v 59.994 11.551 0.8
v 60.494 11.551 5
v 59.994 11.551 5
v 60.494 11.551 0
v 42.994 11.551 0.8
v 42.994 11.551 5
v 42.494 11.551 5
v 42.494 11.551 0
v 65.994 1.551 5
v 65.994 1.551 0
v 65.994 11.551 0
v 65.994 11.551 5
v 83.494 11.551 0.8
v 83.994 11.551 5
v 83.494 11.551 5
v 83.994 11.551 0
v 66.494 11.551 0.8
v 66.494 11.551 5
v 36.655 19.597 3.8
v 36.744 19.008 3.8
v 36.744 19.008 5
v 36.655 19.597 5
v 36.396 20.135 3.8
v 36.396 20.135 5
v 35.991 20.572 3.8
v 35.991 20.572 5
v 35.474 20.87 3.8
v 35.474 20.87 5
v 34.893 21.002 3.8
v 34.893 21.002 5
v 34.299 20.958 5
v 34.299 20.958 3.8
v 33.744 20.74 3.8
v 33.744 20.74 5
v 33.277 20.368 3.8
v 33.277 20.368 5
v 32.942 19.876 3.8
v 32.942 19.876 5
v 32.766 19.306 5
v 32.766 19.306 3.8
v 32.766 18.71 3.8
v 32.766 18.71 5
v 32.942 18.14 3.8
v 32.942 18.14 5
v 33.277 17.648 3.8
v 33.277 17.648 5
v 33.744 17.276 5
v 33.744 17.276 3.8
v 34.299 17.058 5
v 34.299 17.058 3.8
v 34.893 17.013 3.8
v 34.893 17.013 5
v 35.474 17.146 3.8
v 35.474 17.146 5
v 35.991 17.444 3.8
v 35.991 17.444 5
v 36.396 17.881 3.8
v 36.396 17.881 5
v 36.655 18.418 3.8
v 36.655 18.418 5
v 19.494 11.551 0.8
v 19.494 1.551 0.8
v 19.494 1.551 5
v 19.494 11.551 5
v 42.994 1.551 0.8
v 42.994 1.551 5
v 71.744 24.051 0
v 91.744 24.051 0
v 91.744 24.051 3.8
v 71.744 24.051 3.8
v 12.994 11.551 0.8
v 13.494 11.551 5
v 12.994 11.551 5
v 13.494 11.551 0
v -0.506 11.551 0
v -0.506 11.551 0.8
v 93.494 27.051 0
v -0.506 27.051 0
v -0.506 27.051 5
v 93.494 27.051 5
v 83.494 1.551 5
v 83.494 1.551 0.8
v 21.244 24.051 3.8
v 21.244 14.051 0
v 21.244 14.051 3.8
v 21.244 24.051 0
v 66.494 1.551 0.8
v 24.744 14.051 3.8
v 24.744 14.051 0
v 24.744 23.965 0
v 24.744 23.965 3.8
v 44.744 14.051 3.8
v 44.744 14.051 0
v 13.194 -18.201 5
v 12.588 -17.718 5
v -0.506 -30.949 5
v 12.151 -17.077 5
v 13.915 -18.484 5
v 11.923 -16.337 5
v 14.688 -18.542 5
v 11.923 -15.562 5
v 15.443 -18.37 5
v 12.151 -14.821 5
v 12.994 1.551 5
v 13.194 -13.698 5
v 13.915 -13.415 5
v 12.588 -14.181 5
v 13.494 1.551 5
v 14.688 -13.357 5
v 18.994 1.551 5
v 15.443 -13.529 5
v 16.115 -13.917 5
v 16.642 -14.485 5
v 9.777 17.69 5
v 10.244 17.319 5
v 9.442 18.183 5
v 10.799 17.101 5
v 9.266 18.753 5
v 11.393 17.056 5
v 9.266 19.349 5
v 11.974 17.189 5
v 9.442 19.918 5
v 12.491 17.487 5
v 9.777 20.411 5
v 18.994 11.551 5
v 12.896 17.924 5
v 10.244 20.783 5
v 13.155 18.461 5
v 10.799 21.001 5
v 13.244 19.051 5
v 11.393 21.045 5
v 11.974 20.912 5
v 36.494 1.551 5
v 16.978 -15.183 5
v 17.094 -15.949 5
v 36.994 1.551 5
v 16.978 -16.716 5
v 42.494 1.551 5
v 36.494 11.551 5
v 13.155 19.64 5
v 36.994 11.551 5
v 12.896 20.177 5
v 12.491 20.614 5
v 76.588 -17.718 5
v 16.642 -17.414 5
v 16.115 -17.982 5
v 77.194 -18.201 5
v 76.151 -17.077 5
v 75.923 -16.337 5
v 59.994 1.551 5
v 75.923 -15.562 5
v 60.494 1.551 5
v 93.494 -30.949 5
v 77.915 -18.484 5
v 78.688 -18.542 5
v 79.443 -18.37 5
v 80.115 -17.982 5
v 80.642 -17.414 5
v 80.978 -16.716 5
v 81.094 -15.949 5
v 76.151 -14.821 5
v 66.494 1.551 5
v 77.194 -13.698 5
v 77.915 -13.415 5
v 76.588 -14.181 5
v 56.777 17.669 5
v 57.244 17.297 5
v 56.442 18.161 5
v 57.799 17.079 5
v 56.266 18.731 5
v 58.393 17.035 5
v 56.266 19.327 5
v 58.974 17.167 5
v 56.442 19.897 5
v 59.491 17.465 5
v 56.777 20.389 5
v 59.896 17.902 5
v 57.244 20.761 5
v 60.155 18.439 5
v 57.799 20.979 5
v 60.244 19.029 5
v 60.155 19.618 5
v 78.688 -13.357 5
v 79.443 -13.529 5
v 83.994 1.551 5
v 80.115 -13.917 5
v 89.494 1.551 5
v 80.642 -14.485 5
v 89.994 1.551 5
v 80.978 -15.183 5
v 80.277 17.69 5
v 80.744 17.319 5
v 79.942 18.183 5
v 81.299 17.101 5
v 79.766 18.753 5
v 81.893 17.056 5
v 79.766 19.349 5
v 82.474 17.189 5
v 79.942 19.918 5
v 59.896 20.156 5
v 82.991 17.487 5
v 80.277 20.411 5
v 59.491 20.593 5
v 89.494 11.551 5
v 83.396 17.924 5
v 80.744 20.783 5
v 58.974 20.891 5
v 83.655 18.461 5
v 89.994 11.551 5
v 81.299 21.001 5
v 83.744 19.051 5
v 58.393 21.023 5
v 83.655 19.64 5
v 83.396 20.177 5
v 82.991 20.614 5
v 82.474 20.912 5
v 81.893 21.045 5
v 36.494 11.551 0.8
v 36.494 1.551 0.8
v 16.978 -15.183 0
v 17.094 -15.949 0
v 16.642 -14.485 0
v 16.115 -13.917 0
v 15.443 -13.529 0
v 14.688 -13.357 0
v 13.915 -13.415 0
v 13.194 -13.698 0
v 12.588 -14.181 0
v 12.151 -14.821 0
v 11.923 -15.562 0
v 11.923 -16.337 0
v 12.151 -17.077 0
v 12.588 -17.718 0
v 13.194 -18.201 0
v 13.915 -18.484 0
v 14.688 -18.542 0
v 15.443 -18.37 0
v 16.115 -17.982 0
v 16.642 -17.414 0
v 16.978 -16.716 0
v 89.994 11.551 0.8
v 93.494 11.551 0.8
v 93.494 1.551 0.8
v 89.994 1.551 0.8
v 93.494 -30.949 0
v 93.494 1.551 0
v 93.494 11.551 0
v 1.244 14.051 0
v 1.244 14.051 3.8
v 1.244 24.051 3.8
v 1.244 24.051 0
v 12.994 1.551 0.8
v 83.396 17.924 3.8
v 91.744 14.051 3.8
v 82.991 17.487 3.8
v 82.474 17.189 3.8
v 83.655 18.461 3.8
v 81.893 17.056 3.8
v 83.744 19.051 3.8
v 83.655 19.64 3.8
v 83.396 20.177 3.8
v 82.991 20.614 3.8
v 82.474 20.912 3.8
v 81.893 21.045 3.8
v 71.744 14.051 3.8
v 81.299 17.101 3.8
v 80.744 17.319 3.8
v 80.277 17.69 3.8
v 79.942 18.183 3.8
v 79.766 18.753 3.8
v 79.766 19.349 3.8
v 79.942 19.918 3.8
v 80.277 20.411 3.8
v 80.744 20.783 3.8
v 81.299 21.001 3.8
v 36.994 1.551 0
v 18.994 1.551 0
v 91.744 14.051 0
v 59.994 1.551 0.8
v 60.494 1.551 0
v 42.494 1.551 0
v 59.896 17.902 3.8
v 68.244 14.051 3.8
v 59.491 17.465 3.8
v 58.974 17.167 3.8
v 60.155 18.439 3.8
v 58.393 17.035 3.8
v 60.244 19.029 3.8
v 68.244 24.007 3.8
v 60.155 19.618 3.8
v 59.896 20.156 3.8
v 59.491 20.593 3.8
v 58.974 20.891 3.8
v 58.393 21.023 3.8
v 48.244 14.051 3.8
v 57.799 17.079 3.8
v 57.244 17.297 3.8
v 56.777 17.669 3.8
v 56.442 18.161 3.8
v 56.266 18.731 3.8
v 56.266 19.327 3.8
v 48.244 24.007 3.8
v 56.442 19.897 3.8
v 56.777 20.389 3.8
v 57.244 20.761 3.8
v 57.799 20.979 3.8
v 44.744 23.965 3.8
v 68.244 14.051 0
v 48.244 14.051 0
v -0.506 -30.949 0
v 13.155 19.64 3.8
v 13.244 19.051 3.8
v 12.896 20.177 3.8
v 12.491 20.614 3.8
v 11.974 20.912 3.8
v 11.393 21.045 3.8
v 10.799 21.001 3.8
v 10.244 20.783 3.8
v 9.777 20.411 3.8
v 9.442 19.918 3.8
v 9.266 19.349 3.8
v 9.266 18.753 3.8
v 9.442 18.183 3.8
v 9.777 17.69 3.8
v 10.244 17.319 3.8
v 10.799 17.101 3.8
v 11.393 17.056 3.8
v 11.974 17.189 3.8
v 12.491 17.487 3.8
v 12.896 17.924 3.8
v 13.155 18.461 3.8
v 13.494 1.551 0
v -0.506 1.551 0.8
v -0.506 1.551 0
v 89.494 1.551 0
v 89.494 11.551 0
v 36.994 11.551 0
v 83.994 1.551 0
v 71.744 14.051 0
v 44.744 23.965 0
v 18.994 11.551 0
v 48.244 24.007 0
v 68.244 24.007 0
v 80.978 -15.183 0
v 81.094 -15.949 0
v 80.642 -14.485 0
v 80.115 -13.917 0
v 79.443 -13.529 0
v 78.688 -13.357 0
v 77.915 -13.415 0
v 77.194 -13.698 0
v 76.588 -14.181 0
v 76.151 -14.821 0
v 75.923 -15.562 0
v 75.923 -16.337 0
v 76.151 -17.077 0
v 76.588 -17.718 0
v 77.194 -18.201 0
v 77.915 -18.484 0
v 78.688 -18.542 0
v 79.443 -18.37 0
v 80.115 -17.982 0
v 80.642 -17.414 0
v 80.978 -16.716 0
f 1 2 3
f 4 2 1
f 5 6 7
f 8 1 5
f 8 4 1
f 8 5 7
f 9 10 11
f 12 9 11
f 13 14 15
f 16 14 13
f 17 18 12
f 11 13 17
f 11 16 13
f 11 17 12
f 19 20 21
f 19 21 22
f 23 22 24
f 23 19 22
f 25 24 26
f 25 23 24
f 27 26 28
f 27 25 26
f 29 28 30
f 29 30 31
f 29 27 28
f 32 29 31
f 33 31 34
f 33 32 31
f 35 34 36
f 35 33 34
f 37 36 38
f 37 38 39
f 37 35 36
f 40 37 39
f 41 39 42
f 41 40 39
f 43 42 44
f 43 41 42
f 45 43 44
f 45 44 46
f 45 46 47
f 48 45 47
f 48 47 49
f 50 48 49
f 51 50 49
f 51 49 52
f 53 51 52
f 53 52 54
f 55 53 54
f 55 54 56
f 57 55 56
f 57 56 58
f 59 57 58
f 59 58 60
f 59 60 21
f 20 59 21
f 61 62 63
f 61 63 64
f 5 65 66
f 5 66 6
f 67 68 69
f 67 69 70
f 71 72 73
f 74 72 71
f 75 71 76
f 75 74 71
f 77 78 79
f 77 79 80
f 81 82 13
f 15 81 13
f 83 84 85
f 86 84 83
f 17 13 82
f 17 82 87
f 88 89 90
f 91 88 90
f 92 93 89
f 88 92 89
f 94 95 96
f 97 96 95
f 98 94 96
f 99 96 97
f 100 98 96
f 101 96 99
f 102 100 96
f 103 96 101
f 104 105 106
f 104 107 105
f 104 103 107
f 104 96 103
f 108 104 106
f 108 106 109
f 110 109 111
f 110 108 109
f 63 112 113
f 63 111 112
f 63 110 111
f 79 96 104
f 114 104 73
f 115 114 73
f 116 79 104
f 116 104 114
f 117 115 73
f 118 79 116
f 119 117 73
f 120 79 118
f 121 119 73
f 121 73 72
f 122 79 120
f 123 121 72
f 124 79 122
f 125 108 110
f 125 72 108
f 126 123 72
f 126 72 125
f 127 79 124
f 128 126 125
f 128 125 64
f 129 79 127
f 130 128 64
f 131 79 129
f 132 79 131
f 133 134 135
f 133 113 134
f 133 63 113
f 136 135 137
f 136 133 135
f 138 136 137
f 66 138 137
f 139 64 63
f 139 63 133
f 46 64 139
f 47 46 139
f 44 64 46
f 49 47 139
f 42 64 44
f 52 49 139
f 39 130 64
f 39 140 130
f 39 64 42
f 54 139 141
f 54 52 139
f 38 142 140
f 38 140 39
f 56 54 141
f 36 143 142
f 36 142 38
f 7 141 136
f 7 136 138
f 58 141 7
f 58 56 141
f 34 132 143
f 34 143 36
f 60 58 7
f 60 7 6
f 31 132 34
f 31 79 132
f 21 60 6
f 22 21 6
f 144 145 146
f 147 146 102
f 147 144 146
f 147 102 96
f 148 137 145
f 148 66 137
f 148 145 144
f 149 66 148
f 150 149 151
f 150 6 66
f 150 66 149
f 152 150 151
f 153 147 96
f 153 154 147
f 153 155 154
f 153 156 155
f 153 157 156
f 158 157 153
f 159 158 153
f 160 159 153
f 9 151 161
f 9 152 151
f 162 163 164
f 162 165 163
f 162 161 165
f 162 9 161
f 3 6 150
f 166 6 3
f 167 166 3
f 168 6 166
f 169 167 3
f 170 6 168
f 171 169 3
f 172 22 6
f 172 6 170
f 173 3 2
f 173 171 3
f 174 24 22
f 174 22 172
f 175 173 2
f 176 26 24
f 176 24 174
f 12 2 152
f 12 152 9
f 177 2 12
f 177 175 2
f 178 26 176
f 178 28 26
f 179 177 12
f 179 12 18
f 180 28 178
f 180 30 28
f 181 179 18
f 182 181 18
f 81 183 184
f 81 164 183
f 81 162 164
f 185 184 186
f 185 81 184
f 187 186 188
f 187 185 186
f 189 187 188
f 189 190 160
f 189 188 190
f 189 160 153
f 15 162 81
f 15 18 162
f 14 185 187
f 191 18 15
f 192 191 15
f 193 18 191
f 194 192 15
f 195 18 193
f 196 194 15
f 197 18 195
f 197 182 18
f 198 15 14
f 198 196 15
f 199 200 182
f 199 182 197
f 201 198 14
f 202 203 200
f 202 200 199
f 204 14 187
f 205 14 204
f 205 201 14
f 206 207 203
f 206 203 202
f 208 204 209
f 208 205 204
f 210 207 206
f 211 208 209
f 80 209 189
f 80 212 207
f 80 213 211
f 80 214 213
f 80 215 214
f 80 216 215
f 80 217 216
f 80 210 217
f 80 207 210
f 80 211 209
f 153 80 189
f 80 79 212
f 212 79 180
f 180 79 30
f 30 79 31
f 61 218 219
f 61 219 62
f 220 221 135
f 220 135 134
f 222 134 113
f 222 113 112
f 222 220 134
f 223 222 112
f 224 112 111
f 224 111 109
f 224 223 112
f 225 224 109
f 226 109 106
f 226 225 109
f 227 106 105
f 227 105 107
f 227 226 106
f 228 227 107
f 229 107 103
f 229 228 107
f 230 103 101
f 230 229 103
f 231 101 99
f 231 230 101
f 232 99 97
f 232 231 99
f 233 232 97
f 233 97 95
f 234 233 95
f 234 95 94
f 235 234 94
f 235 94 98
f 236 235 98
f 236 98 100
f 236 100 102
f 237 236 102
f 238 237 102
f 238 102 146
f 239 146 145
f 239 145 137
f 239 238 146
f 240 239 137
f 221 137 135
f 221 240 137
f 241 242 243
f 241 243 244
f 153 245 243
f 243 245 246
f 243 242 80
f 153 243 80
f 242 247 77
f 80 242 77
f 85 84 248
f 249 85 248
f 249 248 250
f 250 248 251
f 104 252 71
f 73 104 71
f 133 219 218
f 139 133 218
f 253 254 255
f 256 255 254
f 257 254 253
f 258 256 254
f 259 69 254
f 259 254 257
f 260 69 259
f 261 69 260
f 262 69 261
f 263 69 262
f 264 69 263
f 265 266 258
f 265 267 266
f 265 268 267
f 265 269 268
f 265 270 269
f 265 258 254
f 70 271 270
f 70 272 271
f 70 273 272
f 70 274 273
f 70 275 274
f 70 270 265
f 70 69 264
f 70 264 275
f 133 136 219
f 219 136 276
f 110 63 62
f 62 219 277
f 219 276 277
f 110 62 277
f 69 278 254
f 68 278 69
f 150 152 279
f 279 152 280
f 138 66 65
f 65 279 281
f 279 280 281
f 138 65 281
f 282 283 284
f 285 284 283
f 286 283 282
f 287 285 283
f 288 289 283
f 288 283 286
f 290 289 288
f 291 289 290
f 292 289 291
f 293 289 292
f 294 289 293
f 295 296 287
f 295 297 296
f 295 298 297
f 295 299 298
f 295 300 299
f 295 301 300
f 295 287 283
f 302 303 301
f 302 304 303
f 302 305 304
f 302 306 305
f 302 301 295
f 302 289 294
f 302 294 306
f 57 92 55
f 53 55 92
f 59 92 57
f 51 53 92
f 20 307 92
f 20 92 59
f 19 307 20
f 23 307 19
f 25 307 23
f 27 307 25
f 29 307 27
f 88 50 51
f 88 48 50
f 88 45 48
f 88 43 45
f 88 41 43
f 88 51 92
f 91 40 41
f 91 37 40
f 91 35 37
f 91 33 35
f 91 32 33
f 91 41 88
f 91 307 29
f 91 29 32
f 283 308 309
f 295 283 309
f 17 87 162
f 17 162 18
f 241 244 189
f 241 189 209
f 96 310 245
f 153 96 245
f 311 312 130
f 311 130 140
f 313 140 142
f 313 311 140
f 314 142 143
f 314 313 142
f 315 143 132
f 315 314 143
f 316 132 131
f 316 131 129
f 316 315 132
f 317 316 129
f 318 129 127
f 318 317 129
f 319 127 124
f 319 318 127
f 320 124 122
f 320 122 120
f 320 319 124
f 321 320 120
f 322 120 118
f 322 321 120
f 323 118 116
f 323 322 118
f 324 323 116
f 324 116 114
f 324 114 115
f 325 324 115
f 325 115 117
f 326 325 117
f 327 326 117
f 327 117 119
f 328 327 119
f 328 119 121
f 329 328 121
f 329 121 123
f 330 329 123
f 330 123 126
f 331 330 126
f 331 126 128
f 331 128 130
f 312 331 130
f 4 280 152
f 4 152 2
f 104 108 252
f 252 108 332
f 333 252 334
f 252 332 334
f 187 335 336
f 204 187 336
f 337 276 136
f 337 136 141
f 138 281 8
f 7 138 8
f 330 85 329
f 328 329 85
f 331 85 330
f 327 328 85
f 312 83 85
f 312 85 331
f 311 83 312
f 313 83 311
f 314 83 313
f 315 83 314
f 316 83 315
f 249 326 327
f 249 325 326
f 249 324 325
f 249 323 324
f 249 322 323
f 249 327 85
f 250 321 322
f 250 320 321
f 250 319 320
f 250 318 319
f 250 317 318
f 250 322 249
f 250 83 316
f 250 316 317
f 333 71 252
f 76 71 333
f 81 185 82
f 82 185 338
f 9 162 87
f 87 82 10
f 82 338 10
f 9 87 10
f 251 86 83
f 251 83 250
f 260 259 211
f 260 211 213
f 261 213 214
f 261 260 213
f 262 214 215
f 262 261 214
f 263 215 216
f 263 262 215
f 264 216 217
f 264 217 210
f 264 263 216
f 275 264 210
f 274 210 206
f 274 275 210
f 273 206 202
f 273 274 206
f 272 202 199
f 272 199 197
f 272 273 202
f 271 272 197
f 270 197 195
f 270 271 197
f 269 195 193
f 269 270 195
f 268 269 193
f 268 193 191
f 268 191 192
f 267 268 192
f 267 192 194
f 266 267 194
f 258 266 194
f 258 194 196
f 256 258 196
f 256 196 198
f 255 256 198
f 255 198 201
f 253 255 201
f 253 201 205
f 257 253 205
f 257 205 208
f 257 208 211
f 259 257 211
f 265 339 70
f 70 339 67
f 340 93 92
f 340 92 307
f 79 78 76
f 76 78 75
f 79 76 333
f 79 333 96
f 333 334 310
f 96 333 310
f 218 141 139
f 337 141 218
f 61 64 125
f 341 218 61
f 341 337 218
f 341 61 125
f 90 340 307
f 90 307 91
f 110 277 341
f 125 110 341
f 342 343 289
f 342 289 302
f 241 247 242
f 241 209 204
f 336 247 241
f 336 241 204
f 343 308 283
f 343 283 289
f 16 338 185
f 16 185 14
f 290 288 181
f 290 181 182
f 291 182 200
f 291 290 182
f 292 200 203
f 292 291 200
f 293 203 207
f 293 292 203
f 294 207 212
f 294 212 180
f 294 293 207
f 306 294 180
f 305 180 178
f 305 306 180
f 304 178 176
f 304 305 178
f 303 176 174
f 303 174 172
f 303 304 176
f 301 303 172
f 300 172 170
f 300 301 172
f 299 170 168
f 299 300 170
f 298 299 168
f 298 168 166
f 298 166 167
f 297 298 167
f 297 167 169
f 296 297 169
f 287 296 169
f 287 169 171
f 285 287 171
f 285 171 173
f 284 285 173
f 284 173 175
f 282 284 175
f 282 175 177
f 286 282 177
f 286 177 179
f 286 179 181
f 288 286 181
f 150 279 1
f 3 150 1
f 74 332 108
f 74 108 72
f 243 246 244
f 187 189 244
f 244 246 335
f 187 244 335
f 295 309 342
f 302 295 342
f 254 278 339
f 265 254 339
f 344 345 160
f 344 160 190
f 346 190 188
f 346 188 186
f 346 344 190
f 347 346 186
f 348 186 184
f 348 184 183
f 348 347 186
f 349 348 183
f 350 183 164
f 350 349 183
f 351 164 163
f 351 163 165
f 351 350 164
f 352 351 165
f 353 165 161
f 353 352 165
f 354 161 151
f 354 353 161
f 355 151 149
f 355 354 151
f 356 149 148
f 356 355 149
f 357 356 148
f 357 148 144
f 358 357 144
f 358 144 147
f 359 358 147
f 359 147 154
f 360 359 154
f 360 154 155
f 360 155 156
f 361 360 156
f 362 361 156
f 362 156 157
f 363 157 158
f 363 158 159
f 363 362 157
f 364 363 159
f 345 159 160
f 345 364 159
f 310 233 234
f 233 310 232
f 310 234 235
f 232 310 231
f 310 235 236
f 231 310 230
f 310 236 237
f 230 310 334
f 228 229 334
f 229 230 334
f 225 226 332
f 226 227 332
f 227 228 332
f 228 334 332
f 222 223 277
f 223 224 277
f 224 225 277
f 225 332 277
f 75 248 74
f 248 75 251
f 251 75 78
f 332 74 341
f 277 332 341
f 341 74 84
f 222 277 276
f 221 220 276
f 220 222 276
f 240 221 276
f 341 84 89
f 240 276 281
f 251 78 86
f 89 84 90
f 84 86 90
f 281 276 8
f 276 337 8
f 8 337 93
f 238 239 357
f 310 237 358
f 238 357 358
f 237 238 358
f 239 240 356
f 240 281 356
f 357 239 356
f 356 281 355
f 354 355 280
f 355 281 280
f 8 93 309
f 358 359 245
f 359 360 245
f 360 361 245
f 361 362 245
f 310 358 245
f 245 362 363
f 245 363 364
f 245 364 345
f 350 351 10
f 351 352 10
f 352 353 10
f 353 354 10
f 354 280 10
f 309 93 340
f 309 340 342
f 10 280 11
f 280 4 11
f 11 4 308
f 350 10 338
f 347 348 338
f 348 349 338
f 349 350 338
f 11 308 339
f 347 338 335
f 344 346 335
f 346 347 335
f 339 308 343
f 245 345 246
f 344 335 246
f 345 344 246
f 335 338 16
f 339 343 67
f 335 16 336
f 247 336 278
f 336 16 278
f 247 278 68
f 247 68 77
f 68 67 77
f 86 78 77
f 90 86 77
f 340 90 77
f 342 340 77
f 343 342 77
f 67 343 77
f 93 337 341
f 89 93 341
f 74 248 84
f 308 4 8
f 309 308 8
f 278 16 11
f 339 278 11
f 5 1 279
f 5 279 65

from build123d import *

# Parameters (mm, degrees)
SKETCH_1_W          = 94
SKETCH_1_H          = 28
SKETCH_1_R          = 2
SKETCH_1_H_2        = 30
SKETCH_1_R_2        = 2.6
EXTRUDE_1_DEPTH     = 5
SKETCH_2_W          = 20
SKETCH_2_H          = 10
SKETCH_2_H_2        = 9.9565682
SKETCH_2_H_3        = 9.91450181
CUT_EXTRUDE_1_DEPTH = 3.8
SKETCH_3_W          = 18
SKETCH_3_H          = 10
CUT_EXTRUDE_2_DEPTH = 0.8
SKETCH_4_W          = 0.5
SKETCH_4_H          = 10
CUT_EXTRUDE_3_DEPTH = 6


with BuildPart() as part:
    # 草图1 → 凸台-拉伸1 (new body)
    with BuildSketch(Plane.XY):
        with Locations((46.493576546, 13.050650803)):
            Rectangle(SKETCH_1_W, SKETCH_1_H)
        with Locations((11.243576546, 19.050650803)):
            Circle(SKETCH_1_R, mode=Mode.SUBTRACT)
        with Locations((34.743576546, 19.007901708)):
            Circle(SKETCH_1_R, mode=Mode.SUBTRACT)
        with Locations((58.243576546, 19.028934903)):
            Circle(SKETCH_1_R, mode=Mode.SUBTRACT)
        with Locations((81.743576546, 19.050650803)):
            Circle(SKETCH_1_R, mode=Mode.SUBTRACT)
        with Locations((46.493576546, -15.949349197)):
            Rectangle(SKETCH_1_W, SKETCH_1_H_2)
        with Locations((14.493576546, -15.949349197)):
            Circle(SKETCH_1_R_2, mode=Mode.SUBTRACT)
        with Locations((78.493576546, -15.949349197)):
            Circle(SKETCH_1_R_2, mode=Mode.SUBTRACT)
    extrude(amount=EXTRUDE_1_DEPTH)

    # 草图2 → 切除-拉伸1 (cut)
    with BuildSketch(Plane(origin=(0, 0, 0), x_dir=(-1, 0, 0), z_dir=(0, 0, -1))):
        with Locations((-81.743576546, 19.050650803)):
            Rectangle(SKETCH_2_W, SKETCH_2_H)
        with Locations((-58.243576546, 19.028934903)):
            Rectangle(SKETCH_2_W, SKETCH_2_H_2)
        with Locations((-34.743576546, 19.007901708)):
            Rectangle(SKETCH_2_W, SKETCH_2_H_3)
        with Locations((-11.243576546, 19.050650803)):
            Rectangle(SKETCH_2_W, SKETCH_2_H)
    extrude(amount=-CUT_EXTRUDE_1_DEPTH, mode=Mode.SUBTRACT)

    # 草图3 → 切除-拉伸2 (cut)
    with BuildSketch(Plane(origin=(0, 0, 0), x_dir=(-1, 0, 0), z_dir=(0, 0, -1))):
        with Locations((-4.493576546, 6.550650803)):
            Rectangle(SKETCH_3_W, SKETCH_3_H)
        with Locations((-27.993576546, 6.550650803)):
            Rectangle(SKETCH_3_W, SKETCH_3_H)
        with Locations((-51.493576546, 6.550650803)):
            Rectangle(SKETCH_3_W, SKETCH_3_H)
        with Locations((-74.993576546, 6.550650803)):
            Rectangle(SKETCH_3_W, SKETCH_3_H)
        with Locations((-98.493576546, 6.550650803)):
            Rectangle(SKETCH_3_W, SKETCH_3_H)
    extrude(amount=-CUT_EXTRUDE_2_DEPTH, mode=Mode.SUBTRACT)

    # 草图4 → 切除-拉伸3 (cut, through all)
    with BuildSketch(Plane(origin=(0, 0, 0), x_dir=(-1, 0, 0), z_dir=(0, 0, -1))):
        with Locations((-13.243576546, 6.550650803)):
            Rectangle(SKETCH_4_W, SKETCH_4_H)
        with Locations((-19.243576546, 6.550650803)):
            Rectangle(SKETCH_4_W, SKETCH_4_H)
        with Locations((-36.743576546, 6.550650803)):
            Rectangle(SKETCH_4_W, SKETCH_4_H)
        with Locations((-42.743576546, 6.550650803)):
            Rectangle(SKETCH_4_W, SKETCH_4_H)
        with Locations((-60.243576546, 6.550650803)):
            Rectangle(SKETCH_4_W, SKETCH_4_H)
        with Locations((-66.243576546, 6.550650803)):
            Rectangle(SKETCH_4_W, SKETCH_4_H)
        with Locations((-83.743576546, 6.550650803)):
            Rectangle(SKETCH_4_W, SKETCH_4_H)
        with Locations((-89.743576546, 6.550650803)):
            Rectangle(SKETCH_4_W, SKETCH_4_H)
    extrude(amount=-CUT_EXTRUDE_3_DEPTH, mode=Mode.SUBTRACT)


solid = part.part
